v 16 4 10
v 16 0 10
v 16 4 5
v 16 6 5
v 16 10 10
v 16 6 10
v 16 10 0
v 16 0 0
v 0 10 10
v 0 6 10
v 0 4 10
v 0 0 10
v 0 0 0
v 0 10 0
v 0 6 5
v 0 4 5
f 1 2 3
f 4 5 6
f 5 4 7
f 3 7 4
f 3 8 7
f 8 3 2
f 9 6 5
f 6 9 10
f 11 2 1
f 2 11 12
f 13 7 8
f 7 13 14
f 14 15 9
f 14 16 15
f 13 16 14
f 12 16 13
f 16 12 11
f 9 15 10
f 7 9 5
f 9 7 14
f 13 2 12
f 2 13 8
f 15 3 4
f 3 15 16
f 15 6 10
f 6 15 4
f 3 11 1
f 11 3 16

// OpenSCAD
$fn = 32;

// ----------------------------------------------------------------------
// Micro clip: slotted block, 5-20 mm class
// ----------------------------------------------------------------------

// --- parameters (mm) ---
block_l = 16;             // block length, X
block_w = 10;             // block width, Y
block_h = 10;             // block height, Z
slot_w = 2;               // slot width
slot_d = 5;               // slot depth from the top

difference() {
  cube([block_l, block_w, block_h]);
  translate([-1, block_w / 2 - slot_w / 2, block_h - slot_d])
    cube([block_l + 2, slot_w, slot_d + 1]);
}
